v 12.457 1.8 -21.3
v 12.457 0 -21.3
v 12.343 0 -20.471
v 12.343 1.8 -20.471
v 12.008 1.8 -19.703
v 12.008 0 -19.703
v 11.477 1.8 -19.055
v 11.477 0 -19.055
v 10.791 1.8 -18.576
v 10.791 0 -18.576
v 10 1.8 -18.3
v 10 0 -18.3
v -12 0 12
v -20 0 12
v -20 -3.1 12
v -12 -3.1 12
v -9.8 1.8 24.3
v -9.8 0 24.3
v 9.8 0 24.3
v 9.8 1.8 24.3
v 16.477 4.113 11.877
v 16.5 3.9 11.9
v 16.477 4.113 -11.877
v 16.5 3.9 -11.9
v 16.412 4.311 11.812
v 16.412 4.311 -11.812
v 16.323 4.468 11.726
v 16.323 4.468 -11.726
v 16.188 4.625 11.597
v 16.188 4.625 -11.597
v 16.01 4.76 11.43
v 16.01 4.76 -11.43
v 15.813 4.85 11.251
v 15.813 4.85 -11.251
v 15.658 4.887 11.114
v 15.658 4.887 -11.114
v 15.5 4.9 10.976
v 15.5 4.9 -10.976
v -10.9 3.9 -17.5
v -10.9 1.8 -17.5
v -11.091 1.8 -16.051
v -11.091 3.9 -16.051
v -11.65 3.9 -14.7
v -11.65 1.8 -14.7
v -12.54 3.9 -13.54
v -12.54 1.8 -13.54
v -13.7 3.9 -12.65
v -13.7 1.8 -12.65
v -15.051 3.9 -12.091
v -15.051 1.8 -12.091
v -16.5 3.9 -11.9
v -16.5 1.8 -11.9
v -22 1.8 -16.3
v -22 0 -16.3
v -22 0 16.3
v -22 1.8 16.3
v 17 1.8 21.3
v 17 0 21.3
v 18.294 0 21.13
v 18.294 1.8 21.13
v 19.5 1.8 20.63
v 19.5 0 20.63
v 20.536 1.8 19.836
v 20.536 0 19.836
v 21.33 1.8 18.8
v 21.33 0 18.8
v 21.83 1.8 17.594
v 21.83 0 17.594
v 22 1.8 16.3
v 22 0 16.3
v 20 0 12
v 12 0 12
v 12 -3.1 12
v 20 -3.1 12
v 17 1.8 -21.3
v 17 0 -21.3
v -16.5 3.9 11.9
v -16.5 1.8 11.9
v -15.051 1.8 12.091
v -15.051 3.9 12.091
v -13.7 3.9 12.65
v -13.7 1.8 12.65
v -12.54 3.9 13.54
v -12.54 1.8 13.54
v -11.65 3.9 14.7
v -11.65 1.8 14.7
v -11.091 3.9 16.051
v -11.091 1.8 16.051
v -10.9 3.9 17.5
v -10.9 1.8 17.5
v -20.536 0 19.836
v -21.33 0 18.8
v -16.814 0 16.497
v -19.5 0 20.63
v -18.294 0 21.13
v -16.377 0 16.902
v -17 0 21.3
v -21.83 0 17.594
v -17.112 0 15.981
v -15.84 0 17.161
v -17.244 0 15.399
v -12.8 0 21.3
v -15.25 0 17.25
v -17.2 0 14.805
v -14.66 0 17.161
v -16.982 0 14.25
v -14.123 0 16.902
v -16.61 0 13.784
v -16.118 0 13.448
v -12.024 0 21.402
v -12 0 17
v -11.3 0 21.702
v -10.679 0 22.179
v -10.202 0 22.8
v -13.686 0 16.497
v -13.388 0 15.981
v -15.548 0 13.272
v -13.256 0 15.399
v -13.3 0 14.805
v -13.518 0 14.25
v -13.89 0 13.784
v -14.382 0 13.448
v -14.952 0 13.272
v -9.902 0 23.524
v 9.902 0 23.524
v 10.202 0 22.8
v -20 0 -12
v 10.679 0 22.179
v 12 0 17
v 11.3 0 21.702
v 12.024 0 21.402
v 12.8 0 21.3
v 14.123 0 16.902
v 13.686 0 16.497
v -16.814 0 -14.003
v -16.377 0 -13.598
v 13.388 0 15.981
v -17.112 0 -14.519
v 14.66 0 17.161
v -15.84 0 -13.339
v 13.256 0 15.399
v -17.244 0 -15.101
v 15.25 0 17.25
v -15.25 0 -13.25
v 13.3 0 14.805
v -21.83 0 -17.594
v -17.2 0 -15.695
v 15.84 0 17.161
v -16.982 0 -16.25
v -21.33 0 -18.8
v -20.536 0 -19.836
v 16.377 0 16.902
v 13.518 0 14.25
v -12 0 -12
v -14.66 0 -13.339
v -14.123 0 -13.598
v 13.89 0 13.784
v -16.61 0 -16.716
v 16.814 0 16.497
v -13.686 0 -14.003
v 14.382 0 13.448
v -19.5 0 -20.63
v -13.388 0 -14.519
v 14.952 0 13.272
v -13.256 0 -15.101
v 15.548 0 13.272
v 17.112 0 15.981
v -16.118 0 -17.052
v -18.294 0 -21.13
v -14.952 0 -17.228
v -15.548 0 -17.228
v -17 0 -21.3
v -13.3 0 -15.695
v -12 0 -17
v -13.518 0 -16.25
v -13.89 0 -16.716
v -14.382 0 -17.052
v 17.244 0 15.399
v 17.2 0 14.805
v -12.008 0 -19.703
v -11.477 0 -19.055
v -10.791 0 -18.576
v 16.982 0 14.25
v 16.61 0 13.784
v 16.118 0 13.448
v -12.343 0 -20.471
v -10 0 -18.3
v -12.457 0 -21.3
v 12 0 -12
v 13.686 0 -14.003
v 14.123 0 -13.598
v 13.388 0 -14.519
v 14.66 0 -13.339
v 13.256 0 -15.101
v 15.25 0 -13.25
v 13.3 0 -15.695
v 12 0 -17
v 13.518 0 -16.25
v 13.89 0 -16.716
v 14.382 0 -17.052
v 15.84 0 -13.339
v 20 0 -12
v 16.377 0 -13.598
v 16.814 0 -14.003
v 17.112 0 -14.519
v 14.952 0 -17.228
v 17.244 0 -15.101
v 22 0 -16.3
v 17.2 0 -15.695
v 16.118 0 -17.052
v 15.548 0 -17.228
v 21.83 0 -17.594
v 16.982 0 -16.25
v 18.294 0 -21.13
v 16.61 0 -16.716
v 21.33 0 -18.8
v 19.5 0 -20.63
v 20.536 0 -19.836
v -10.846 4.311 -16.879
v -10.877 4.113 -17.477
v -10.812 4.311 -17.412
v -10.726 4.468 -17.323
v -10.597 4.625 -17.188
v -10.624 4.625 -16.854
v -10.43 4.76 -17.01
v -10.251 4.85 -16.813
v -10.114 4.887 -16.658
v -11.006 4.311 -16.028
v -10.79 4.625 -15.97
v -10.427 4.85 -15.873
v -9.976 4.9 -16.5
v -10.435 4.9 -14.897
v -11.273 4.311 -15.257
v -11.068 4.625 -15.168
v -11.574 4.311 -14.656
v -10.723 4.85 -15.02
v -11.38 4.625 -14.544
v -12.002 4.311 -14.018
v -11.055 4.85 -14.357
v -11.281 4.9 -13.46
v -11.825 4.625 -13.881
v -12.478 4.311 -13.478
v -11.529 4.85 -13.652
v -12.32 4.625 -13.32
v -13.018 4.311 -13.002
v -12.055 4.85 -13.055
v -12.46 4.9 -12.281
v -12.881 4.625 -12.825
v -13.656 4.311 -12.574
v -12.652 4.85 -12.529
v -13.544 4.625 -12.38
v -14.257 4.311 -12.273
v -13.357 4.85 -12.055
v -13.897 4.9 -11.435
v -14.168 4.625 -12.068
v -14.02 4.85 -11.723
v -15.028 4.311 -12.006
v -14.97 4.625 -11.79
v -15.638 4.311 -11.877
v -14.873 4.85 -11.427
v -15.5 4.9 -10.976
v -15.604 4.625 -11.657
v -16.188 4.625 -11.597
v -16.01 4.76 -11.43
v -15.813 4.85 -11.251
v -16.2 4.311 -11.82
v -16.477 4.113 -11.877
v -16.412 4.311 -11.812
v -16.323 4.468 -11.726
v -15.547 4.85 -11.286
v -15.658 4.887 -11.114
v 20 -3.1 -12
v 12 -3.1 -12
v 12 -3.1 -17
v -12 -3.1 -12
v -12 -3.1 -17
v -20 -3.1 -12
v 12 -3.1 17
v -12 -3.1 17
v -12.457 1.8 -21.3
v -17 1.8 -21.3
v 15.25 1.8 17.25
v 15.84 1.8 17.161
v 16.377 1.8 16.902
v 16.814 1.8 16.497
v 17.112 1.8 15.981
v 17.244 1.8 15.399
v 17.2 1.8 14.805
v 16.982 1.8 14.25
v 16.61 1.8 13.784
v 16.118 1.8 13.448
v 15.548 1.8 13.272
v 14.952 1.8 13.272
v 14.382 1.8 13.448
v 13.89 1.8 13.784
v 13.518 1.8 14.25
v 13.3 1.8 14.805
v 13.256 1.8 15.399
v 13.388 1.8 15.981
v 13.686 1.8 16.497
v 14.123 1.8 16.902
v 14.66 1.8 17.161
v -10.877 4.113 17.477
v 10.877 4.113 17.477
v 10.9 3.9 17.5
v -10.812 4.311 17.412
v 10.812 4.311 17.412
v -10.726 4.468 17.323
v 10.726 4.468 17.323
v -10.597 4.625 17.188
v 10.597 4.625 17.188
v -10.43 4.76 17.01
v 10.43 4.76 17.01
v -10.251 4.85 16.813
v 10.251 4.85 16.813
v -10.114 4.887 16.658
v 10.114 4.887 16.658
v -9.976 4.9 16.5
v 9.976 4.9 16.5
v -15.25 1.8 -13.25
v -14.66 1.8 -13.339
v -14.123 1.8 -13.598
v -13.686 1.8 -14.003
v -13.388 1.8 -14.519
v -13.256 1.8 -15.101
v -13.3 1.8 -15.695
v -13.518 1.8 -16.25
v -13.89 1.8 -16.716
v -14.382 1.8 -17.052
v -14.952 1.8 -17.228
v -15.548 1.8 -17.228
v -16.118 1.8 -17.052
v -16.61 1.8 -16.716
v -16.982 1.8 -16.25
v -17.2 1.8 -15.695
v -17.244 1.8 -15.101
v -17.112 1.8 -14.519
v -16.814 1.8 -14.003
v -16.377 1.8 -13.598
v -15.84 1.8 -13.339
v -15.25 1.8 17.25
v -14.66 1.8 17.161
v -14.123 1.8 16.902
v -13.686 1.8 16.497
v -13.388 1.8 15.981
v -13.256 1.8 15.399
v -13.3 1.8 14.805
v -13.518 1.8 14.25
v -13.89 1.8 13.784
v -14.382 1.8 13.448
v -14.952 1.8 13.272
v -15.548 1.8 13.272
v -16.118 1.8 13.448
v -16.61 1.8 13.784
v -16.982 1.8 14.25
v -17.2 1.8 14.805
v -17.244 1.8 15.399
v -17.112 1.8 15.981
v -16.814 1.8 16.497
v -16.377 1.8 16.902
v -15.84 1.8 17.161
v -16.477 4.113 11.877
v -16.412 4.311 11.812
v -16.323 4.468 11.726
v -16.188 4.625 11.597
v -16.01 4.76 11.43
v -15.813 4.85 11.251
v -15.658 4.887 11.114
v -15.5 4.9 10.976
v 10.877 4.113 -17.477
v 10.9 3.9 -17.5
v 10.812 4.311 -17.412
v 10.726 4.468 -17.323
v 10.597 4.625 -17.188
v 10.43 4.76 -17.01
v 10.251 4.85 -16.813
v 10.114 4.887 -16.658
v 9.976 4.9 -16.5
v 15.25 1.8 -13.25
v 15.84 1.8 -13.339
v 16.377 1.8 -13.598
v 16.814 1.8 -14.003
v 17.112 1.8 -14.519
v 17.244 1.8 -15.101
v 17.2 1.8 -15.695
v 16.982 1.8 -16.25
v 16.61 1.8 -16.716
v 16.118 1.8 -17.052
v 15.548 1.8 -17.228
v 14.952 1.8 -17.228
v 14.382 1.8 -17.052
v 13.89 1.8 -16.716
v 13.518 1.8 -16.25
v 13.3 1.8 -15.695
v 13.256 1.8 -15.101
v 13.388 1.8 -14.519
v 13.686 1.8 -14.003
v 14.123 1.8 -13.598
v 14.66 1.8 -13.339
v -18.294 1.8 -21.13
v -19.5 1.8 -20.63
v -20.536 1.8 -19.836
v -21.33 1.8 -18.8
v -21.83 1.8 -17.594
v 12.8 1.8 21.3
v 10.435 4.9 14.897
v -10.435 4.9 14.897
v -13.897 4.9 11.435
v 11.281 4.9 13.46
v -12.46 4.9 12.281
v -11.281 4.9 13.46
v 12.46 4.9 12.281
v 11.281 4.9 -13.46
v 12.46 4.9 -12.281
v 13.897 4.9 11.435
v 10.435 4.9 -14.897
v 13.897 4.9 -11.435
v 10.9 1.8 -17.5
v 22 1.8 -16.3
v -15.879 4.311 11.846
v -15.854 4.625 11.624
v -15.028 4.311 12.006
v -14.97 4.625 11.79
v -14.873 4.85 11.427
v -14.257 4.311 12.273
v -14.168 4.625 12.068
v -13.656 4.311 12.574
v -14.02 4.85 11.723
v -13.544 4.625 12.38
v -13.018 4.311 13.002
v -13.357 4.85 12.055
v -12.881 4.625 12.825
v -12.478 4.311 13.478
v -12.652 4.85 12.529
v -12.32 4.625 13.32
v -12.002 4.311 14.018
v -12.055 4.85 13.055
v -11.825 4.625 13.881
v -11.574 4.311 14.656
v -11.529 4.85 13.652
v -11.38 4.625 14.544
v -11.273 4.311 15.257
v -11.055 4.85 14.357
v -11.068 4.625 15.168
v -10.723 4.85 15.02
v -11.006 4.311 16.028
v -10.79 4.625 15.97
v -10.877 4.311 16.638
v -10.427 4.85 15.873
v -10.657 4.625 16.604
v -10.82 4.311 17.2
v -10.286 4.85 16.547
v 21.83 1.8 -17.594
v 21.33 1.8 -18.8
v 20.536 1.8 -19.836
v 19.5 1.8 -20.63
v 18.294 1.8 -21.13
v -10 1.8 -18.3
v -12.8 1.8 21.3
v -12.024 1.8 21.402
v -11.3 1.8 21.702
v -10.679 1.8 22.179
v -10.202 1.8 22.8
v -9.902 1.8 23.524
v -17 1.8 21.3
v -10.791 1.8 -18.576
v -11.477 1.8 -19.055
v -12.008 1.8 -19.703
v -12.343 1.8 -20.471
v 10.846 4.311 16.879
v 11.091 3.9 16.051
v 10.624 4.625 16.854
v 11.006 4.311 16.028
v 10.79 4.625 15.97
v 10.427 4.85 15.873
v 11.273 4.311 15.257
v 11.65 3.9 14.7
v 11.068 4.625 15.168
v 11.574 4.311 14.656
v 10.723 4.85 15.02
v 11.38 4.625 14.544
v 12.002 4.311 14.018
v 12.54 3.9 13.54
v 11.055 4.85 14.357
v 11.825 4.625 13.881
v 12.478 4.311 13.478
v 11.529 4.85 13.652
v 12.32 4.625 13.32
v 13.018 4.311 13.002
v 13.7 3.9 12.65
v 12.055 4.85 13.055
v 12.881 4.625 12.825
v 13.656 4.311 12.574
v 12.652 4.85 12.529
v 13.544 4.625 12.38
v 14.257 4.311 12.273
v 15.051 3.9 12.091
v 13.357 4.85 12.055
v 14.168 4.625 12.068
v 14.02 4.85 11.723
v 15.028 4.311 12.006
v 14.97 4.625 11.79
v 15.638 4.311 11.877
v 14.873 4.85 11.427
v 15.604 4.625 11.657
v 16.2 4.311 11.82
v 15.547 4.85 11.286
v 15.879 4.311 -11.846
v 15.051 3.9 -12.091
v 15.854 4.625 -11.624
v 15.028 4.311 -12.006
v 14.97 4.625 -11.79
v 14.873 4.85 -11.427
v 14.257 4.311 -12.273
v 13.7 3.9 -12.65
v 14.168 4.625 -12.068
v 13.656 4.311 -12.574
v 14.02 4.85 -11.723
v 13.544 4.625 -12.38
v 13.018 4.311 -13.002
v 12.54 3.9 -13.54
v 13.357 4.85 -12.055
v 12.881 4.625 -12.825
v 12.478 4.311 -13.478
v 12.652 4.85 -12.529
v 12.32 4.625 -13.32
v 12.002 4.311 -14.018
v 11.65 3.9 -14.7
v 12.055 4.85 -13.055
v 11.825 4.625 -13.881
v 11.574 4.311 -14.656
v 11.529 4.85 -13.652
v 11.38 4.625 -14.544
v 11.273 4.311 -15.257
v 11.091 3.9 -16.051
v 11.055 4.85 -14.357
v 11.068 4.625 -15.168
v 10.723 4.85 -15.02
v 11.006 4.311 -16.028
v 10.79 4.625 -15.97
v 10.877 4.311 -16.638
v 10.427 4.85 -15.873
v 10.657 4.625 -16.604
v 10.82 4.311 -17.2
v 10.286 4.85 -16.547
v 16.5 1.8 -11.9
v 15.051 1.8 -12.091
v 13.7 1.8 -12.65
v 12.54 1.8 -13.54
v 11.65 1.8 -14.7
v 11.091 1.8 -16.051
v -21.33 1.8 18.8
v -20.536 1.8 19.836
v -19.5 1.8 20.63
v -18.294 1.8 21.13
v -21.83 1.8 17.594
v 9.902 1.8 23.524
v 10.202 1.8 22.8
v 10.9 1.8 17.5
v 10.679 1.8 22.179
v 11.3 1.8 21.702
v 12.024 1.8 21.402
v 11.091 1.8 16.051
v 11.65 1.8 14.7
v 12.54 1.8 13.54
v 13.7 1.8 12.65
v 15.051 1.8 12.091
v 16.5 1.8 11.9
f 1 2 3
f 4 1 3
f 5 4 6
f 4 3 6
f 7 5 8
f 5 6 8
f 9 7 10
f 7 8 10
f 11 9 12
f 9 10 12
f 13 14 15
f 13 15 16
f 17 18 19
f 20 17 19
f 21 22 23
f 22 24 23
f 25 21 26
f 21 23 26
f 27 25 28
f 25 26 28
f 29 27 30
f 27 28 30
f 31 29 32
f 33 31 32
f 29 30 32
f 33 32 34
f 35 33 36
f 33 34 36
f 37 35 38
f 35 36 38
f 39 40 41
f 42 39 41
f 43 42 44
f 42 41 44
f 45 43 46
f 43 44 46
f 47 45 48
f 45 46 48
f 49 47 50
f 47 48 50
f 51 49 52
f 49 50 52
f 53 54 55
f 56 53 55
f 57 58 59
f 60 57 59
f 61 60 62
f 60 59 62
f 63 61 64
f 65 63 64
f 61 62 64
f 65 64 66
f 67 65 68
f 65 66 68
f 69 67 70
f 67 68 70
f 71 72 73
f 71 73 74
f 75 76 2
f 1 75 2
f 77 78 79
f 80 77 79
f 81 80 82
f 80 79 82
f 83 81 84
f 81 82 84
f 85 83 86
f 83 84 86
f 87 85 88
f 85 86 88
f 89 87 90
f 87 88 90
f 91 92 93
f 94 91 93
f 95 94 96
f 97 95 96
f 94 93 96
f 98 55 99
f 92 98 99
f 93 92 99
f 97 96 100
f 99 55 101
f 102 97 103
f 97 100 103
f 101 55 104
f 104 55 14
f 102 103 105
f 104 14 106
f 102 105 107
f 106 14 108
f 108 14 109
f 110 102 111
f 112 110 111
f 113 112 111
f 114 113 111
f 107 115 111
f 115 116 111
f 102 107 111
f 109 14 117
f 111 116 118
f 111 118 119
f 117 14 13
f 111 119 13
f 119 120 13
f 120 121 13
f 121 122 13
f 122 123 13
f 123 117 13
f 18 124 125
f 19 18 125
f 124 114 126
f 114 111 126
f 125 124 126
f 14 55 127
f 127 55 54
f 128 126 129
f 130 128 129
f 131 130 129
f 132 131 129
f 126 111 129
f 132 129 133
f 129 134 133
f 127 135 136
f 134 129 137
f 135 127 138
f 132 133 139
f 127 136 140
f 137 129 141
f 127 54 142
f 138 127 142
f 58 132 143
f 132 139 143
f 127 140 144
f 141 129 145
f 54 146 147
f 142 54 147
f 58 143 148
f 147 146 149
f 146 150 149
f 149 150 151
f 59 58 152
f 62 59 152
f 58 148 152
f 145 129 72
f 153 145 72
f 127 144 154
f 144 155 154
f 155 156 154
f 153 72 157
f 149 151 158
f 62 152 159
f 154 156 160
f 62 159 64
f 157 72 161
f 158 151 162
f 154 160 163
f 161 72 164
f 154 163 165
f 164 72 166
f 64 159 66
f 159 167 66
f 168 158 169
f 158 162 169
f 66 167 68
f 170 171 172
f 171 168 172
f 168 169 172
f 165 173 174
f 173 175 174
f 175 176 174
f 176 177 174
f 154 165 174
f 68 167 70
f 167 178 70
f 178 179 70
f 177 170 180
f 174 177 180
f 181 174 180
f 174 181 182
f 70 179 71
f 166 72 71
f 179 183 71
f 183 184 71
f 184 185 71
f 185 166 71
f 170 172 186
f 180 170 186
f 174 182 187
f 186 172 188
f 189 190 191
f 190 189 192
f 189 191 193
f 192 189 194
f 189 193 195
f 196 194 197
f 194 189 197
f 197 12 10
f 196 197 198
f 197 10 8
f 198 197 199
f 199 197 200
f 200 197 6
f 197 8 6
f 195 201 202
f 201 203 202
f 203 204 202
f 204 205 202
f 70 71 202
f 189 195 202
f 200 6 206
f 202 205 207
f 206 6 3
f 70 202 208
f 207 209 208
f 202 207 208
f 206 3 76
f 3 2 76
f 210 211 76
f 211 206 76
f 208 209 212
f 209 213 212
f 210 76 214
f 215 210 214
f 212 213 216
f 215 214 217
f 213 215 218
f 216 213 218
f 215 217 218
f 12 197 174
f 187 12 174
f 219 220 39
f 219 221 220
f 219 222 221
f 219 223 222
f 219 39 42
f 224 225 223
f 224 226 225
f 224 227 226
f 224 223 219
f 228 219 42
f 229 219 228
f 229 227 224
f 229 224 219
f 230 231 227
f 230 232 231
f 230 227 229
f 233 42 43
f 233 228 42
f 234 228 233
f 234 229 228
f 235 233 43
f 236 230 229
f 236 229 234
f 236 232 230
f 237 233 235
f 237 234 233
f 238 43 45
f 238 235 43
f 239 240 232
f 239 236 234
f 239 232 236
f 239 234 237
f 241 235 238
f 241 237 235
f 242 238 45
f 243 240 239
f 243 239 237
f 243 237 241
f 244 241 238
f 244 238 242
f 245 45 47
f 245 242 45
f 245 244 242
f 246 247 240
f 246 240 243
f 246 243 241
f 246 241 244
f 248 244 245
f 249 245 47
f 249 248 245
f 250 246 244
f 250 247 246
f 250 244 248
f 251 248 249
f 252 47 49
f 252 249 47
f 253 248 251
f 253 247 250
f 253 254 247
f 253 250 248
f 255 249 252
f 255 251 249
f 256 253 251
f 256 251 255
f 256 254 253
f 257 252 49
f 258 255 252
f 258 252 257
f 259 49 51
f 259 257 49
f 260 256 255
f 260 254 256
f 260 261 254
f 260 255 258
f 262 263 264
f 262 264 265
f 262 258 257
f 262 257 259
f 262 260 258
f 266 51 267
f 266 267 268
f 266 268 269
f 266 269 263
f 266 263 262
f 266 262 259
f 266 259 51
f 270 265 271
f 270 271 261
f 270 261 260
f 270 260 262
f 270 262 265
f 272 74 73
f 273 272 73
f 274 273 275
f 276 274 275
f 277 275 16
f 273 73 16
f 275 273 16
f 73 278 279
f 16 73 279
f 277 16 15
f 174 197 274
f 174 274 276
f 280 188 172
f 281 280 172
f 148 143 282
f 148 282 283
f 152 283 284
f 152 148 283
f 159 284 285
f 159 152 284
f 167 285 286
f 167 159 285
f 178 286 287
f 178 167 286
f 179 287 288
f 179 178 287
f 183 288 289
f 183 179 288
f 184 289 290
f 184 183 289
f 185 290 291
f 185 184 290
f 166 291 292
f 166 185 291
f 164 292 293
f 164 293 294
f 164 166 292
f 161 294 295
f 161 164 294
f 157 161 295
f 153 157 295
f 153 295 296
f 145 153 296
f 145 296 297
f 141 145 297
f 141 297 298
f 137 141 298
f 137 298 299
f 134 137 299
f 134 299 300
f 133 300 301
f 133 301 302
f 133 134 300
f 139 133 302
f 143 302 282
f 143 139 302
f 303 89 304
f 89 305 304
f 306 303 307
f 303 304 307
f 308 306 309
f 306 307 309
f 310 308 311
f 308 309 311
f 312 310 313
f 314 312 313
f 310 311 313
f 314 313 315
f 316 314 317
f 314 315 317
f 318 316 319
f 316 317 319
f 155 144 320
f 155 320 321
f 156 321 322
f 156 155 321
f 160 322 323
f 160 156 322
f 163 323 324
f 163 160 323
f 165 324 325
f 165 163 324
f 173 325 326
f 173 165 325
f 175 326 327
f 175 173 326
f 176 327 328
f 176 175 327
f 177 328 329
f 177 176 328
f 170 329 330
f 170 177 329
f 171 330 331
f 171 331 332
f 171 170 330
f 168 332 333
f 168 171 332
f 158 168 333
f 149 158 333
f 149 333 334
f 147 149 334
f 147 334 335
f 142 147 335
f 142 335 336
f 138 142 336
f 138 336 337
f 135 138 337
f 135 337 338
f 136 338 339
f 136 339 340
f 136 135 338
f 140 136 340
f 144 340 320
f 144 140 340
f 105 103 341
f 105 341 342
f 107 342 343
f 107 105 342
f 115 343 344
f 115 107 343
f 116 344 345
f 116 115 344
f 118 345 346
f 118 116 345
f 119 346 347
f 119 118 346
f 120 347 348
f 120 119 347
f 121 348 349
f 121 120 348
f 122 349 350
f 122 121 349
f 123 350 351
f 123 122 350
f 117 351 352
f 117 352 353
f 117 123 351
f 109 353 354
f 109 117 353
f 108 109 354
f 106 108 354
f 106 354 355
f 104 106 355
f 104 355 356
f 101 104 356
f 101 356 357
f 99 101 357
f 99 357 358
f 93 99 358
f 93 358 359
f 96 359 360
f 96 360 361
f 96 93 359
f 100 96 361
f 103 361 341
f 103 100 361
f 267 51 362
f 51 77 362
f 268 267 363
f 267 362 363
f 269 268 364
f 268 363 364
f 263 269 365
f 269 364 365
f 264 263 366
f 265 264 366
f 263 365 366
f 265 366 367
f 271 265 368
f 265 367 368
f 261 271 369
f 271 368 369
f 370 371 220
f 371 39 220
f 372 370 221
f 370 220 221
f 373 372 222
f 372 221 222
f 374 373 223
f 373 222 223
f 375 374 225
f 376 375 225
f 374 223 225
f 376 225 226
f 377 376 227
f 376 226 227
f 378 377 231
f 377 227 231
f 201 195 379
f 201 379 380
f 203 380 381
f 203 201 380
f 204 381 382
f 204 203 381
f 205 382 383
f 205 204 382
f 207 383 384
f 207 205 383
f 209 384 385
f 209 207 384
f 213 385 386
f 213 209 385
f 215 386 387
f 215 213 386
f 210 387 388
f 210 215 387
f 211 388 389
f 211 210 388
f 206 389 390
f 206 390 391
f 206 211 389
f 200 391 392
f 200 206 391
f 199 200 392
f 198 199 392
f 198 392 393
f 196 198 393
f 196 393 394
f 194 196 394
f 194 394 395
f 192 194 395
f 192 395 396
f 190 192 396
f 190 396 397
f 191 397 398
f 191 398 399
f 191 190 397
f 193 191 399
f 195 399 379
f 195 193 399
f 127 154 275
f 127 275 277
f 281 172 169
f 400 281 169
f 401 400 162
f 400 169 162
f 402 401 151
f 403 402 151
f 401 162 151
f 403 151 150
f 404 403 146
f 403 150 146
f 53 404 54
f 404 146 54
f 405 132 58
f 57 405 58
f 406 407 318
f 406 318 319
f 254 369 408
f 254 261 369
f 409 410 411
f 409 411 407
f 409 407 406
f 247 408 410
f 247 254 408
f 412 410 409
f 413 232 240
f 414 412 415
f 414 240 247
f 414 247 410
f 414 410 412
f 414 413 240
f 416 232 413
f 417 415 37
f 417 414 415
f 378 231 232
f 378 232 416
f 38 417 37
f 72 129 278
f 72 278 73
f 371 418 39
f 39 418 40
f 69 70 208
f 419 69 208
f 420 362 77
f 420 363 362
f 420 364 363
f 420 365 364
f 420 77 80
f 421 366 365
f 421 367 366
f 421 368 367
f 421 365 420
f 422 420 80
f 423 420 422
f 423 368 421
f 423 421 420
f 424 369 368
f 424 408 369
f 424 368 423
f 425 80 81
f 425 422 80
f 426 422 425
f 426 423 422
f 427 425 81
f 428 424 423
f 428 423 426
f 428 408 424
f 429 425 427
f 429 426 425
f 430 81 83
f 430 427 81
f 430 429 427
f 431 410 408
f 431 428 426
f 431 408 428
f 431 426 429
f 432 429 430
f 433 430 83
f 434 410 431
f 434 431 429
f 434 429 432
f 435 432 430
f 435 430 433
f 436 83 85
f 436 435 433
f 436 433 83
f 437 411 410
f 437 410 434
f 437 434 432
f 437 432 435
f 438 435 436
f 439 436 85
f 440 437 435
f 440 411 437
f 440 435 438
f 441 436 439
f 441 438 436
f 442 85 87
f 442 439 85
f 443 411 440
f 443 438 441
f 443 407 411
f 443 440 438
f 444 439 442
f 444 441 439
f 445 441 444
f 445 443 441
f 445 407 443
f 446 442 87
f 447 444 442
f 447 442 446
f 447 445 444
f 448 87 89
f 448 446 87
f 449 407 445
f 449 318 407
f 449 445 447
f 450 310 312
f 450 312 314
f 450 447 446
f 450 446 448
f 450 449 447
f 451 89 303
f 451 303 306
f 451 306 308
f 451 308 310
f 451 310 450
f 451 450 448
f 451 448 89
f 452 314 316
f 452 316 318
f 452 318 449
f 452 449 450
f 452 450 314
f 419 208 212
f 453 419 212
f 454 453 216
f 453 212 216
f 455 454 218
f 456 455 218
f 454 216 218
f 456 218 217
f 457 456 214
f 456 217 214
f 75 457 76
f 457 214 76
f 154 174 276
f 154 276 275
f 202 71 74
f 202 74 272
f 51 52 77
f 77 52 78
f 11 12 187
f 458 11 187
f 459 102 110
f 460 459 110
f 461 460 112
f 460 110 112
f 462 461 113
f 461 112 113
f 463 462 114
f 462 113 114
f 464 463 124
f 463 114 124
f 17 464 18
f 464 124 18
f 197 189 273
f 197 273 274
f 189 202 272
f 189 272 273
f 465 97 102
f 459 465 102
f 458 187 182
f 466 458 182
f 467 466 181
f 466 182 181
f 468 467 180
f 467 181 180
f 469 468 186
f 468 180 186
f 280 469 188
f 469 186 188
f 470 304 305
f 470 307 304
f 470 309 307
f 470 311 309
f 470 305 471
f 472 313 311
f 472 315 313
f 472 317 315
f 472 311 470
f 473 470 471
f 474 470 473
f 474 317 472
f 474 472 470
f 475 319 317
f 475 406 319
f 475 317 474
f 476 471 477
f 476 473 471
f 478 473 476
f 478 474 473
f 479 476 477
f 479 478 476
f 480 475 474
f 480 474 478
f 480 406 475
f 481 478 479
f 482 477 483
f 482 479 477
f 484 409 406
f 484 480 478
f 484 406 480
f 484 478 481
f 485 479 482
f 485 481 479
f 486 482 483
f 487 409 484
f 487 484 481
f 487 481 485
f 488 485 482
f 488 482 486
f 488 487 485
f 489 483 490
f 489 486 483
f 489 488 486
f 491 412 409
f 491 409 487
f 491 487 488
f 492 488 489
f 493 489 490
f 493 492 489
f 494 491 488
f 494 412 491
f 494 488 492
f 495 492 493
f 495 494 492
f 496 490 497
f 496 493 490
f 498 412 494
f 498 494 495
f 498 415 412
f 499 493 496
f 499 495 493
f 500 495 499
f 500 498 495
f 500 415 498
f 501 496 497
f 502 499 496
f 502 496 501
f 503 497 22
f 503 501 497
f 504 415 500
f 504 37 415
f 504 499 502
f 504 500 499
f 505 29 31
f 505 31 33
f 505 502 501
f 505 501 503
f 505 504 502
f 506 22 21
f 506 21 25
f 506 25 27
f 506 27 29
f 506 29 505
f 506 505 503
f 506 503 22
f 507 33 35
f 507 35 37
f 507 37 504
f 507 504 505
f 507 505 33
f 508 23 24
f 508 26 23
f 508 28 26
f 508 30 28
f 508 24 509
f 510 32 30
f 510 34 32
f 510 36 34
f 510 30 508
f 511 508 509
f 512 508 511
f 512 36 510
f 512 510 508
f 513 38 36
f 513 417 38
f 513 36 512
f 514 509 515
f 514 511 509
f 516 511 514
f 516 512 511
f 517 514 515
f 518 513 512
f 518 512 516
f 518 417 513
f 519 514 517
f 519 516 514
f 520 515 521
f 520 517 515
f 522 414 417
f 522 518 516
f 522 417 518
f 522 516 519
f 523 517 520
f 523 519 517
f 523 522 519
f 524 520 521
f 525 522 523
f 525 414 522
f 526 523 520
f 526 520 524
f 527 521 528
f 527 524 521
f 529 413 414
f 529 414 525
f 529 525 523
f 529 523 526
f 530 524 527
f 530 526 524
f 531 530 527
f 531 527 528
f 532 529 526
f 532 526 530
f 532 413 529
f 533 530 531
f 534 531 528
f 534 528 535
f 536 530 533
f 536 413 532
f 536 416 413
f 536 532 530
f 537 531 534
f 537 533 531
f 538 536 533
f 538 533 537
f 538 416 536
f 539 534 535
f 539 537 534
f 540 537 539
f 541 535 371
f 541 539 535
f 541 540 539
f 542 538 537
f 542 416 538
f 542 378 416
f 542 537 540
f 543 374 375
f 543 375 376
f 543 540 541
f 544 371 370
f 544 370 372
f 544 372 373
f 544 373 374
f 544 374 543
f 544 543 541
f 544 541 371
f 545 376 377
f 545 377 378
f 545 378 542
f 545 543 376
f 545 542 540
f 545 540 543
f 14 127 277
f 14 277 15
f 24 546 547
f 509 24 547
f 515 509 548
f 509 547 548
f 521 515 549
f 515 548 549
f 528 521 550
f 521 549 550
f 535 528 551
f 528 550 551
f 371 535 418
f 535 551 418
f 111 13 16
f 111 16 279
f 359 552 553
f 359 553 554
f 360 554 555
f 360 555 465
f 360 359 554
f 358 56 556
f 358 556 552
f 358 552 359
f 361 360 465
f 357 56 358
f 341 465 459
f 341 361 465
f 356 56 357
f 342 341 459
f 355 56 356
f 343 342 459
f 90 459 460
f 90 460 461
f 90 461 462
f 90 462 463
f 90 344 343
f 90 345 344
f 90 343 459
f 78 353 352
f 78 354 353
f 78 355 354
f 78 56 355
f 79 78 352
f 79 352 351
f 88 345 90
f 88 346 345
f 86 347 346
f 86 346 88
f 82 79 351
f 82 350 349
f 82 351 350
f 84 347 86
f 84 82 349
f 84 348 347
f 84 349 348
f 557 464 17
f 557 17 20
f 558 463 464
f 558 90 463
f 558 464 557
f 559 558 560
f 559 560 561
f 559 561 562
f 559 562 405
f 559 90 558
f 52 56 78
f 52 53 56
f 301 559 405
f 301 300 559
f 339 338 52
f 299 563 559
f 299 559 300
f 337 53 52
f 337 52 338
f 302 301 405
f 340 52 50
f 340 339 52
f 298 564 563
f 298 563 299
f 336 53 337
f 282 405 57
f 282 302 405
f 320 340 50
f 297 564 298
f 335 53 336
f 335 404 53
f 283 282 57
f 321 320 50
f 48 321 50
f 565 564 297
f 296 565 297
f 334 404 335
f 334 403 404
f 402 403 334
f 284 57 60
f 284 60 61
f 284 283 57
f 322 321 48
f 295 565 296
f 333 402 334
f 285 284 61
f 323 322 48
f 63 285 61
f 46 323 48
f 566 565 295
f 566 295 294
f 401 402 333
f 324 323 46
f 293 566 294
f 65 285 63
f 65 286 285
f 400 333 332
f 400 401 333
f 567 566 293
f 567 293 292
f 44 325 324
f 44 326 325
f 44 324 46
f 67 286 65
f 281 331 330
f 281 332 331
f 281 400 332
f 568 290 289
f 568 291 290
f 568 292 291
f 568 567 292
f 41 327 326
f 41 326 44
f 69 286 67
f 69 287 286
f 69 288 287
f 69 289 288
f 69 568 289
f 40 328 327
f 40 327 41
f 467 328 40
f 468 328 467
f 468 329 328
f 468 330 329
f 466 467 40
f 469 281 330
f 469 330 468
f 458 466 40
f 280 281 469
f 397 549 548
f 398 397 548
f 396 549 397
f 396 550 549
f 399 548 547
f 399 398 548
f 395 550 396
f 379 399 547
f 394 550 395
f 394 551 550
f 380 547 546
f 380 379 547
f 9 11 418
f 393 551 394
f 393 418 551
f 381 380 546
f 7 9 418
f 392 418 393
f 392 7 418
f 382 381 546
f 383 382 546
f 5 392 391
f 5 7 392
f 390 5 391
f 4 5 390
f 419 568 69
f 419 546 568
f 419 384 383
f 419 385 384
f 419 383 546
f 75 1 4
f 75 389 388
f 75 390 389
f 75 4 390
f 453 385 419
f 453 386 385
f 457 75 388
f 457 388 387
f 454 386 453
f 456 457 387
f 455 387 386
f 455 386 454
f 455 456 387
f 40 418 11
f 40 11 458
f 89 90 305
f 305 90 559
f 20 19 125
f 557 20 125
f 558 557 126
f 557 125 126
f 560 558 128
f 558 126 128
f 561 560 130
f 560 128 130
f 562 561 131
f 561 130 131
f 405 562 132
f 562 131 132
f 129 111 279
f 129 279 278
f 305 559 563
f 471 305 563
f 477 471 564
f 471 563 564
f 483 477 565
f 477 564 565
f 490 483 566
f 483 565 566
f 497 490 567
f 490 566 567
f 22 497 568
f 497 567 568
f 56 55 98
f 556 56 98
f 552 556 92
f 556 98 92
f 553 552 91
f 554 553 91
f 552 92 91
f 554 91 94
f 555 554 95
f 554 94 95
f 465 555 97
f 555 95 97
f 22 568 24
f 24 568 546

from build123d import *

# Parameters (mm, degrees)
SZKIC1_R                    = 2
DODANIE_WYCI_GNI_CIE1_DEPTH = 1.8
DODANIE_WYCI_GNI_CIE2_DEPTH = 3.1
ZAOKR_GLENIE1_R             = 1
DODANIE_WYCI_GNI_CIE3_DEPTH = 3.1


with BuildPart() as part:
    # Szkic1 → Dodanie-wyciągnięcie1 (new body)
    with BuildSketch(Plane(origin=(0, 0, 0), x_dir=(1, 0, 0), z_dir=(0, 1, 0))):
        with BuildLine():
            Line((-17, -21.3), (-12.8, -21.3))
            ThreePointArc((-12.8, -21.3), (-10.678679656, -22.178679656), (-9.8, -24.3))
            Line((-9.8, -24.3), (9.8, -24.3))
            ThreePointArc((9.8, -24.3), (10.678679656, -22.178679656), (12.8, -21.3))
            Line((12.8, -21.3), (17, -21.3))
            ThreePointArc((17, -21.3), (20.535533906, -19.835533906), (22, -16.3))
            Line((22, -16.3), (22, 16.3))
            ThreePointArc((22, 16.3), (20.535533906, 19.835533906), (17, 21.3))
            Line((17, 21.3), (12.457318825, 21.3))
            ThreePointArc((12.457318825, 21.3), (11.764572554, 19.361030183), (10, 18.3))
            Line((10, 18.3), (-10, 18.3))
            ThreePointArc((-10, 18.3), (-11.764572554, 19.361030183), (-12.457318825, 21.3))
            Line((-12.457318825, 21.3), (-17, 21.3))
            ThreePointArc((-17, 21.3), (-20.535533906, 19.835533906), (-22, 16.3))
            Line((-22, 16.3), (-22, -16.3))
            ThreePointArc((-22, -16.3), (-20.535533906, -19.835533906), (-17, -21.3))
        make_face()
        with Locations(Location((15.25, 15.25, 0), (0, 0, 270))):
            Circle(SZKIC1_R, mode=Mode.SUBTRACT)
        with Locations(Location((15.25, -15.25, 0), (0, 0, 270))):
            Circle(SZKIC1_R, mode=Mode.SUBTRACT)
        with Locations(Location((-15.25, -15.25, 0), (0, 0, 270))):
            Circle(SZKIC1_R, mode=Mode.SUBTRACT)
        with Locations(Location((-15.25, 15.25, 0), (0, 0, 270))):
            Circle(SZKIC1_R, mode=Mode.SUBTRACT)
    extrude(amount=DODANIE_WYCI_GNI_CIE1_DEPTH)

    # Szkic2 → Dodanie-wyciągnięcie2 (add)
    with BuildSketch(Plane(origin=(0, 1.8, 0), x_dir=(1, 0, 0), z_dir=(0, 1, 0))):
        with BuildLine():
            Line((-10.9, -17.5), (10.9, -17.5))
            ThreePointArc((10.9, -17.5), (12.540202025, -13.540202025), (16.5, -11.9))
            Line((16.5, -11.9), (16.5, 11.9))
            ThreePointArc((16.5, 11.9), (12.540202025, 13.540202025), (10.9, 17.5))
            Line((10.9, 17.5), (-10.9, 17.5))
            ThreePointArc((-10.9, 17.5), (-12.540202025, 13.540202025), (-16.5, 11.9))
            Line((-16.5, 11.9), (-16.5, -11.9))
            ThreePointArc((-16.5, -11.9), (-12.540202025, -13.540202025), (-10.9, -17.5))
        make_face()
    extrude(amount=DODANIE_WYCI_GNI_CIE2_DEPTH)

    # Zaokrąglenie1
    zaokr_glenie1_edges = [part.edges().sort_by_distance(p)[0] for p in [
        (-12.540202025, 4.9, 13.540202025),
        (0, 4.9, 17.5),
        (12.540202025, 4.9, 13.540202025),
        (16.5, 4.9, 0),
        (12.540202025, 4.9, -13.540202025),
        (0, 4.9, -17.5),
        (-12.540202025, 4.9, -13.540202025),
        (-16.5, 4.9, 0),
    ]]
    fillet(zaokr_glenie1_edges, radius=ZAOKR_GLENIE1_R)

    # Szkic3 → Dodanie-wyciągnięcie3 (add)
    with BuildSketch(Plane.XZ):
        Polygon((-12, 17), (12, 17), (12, 12), (20, 12), (20, -12), (12, -12), (12, -17), (-12, -17), (-12, -12), (-20, -12), (-20, 12), (-12, 12), align=None)
    extrude(amount=DODANIE_WYCI_GNI_CIE3_DEPTH)


solid = part.part
